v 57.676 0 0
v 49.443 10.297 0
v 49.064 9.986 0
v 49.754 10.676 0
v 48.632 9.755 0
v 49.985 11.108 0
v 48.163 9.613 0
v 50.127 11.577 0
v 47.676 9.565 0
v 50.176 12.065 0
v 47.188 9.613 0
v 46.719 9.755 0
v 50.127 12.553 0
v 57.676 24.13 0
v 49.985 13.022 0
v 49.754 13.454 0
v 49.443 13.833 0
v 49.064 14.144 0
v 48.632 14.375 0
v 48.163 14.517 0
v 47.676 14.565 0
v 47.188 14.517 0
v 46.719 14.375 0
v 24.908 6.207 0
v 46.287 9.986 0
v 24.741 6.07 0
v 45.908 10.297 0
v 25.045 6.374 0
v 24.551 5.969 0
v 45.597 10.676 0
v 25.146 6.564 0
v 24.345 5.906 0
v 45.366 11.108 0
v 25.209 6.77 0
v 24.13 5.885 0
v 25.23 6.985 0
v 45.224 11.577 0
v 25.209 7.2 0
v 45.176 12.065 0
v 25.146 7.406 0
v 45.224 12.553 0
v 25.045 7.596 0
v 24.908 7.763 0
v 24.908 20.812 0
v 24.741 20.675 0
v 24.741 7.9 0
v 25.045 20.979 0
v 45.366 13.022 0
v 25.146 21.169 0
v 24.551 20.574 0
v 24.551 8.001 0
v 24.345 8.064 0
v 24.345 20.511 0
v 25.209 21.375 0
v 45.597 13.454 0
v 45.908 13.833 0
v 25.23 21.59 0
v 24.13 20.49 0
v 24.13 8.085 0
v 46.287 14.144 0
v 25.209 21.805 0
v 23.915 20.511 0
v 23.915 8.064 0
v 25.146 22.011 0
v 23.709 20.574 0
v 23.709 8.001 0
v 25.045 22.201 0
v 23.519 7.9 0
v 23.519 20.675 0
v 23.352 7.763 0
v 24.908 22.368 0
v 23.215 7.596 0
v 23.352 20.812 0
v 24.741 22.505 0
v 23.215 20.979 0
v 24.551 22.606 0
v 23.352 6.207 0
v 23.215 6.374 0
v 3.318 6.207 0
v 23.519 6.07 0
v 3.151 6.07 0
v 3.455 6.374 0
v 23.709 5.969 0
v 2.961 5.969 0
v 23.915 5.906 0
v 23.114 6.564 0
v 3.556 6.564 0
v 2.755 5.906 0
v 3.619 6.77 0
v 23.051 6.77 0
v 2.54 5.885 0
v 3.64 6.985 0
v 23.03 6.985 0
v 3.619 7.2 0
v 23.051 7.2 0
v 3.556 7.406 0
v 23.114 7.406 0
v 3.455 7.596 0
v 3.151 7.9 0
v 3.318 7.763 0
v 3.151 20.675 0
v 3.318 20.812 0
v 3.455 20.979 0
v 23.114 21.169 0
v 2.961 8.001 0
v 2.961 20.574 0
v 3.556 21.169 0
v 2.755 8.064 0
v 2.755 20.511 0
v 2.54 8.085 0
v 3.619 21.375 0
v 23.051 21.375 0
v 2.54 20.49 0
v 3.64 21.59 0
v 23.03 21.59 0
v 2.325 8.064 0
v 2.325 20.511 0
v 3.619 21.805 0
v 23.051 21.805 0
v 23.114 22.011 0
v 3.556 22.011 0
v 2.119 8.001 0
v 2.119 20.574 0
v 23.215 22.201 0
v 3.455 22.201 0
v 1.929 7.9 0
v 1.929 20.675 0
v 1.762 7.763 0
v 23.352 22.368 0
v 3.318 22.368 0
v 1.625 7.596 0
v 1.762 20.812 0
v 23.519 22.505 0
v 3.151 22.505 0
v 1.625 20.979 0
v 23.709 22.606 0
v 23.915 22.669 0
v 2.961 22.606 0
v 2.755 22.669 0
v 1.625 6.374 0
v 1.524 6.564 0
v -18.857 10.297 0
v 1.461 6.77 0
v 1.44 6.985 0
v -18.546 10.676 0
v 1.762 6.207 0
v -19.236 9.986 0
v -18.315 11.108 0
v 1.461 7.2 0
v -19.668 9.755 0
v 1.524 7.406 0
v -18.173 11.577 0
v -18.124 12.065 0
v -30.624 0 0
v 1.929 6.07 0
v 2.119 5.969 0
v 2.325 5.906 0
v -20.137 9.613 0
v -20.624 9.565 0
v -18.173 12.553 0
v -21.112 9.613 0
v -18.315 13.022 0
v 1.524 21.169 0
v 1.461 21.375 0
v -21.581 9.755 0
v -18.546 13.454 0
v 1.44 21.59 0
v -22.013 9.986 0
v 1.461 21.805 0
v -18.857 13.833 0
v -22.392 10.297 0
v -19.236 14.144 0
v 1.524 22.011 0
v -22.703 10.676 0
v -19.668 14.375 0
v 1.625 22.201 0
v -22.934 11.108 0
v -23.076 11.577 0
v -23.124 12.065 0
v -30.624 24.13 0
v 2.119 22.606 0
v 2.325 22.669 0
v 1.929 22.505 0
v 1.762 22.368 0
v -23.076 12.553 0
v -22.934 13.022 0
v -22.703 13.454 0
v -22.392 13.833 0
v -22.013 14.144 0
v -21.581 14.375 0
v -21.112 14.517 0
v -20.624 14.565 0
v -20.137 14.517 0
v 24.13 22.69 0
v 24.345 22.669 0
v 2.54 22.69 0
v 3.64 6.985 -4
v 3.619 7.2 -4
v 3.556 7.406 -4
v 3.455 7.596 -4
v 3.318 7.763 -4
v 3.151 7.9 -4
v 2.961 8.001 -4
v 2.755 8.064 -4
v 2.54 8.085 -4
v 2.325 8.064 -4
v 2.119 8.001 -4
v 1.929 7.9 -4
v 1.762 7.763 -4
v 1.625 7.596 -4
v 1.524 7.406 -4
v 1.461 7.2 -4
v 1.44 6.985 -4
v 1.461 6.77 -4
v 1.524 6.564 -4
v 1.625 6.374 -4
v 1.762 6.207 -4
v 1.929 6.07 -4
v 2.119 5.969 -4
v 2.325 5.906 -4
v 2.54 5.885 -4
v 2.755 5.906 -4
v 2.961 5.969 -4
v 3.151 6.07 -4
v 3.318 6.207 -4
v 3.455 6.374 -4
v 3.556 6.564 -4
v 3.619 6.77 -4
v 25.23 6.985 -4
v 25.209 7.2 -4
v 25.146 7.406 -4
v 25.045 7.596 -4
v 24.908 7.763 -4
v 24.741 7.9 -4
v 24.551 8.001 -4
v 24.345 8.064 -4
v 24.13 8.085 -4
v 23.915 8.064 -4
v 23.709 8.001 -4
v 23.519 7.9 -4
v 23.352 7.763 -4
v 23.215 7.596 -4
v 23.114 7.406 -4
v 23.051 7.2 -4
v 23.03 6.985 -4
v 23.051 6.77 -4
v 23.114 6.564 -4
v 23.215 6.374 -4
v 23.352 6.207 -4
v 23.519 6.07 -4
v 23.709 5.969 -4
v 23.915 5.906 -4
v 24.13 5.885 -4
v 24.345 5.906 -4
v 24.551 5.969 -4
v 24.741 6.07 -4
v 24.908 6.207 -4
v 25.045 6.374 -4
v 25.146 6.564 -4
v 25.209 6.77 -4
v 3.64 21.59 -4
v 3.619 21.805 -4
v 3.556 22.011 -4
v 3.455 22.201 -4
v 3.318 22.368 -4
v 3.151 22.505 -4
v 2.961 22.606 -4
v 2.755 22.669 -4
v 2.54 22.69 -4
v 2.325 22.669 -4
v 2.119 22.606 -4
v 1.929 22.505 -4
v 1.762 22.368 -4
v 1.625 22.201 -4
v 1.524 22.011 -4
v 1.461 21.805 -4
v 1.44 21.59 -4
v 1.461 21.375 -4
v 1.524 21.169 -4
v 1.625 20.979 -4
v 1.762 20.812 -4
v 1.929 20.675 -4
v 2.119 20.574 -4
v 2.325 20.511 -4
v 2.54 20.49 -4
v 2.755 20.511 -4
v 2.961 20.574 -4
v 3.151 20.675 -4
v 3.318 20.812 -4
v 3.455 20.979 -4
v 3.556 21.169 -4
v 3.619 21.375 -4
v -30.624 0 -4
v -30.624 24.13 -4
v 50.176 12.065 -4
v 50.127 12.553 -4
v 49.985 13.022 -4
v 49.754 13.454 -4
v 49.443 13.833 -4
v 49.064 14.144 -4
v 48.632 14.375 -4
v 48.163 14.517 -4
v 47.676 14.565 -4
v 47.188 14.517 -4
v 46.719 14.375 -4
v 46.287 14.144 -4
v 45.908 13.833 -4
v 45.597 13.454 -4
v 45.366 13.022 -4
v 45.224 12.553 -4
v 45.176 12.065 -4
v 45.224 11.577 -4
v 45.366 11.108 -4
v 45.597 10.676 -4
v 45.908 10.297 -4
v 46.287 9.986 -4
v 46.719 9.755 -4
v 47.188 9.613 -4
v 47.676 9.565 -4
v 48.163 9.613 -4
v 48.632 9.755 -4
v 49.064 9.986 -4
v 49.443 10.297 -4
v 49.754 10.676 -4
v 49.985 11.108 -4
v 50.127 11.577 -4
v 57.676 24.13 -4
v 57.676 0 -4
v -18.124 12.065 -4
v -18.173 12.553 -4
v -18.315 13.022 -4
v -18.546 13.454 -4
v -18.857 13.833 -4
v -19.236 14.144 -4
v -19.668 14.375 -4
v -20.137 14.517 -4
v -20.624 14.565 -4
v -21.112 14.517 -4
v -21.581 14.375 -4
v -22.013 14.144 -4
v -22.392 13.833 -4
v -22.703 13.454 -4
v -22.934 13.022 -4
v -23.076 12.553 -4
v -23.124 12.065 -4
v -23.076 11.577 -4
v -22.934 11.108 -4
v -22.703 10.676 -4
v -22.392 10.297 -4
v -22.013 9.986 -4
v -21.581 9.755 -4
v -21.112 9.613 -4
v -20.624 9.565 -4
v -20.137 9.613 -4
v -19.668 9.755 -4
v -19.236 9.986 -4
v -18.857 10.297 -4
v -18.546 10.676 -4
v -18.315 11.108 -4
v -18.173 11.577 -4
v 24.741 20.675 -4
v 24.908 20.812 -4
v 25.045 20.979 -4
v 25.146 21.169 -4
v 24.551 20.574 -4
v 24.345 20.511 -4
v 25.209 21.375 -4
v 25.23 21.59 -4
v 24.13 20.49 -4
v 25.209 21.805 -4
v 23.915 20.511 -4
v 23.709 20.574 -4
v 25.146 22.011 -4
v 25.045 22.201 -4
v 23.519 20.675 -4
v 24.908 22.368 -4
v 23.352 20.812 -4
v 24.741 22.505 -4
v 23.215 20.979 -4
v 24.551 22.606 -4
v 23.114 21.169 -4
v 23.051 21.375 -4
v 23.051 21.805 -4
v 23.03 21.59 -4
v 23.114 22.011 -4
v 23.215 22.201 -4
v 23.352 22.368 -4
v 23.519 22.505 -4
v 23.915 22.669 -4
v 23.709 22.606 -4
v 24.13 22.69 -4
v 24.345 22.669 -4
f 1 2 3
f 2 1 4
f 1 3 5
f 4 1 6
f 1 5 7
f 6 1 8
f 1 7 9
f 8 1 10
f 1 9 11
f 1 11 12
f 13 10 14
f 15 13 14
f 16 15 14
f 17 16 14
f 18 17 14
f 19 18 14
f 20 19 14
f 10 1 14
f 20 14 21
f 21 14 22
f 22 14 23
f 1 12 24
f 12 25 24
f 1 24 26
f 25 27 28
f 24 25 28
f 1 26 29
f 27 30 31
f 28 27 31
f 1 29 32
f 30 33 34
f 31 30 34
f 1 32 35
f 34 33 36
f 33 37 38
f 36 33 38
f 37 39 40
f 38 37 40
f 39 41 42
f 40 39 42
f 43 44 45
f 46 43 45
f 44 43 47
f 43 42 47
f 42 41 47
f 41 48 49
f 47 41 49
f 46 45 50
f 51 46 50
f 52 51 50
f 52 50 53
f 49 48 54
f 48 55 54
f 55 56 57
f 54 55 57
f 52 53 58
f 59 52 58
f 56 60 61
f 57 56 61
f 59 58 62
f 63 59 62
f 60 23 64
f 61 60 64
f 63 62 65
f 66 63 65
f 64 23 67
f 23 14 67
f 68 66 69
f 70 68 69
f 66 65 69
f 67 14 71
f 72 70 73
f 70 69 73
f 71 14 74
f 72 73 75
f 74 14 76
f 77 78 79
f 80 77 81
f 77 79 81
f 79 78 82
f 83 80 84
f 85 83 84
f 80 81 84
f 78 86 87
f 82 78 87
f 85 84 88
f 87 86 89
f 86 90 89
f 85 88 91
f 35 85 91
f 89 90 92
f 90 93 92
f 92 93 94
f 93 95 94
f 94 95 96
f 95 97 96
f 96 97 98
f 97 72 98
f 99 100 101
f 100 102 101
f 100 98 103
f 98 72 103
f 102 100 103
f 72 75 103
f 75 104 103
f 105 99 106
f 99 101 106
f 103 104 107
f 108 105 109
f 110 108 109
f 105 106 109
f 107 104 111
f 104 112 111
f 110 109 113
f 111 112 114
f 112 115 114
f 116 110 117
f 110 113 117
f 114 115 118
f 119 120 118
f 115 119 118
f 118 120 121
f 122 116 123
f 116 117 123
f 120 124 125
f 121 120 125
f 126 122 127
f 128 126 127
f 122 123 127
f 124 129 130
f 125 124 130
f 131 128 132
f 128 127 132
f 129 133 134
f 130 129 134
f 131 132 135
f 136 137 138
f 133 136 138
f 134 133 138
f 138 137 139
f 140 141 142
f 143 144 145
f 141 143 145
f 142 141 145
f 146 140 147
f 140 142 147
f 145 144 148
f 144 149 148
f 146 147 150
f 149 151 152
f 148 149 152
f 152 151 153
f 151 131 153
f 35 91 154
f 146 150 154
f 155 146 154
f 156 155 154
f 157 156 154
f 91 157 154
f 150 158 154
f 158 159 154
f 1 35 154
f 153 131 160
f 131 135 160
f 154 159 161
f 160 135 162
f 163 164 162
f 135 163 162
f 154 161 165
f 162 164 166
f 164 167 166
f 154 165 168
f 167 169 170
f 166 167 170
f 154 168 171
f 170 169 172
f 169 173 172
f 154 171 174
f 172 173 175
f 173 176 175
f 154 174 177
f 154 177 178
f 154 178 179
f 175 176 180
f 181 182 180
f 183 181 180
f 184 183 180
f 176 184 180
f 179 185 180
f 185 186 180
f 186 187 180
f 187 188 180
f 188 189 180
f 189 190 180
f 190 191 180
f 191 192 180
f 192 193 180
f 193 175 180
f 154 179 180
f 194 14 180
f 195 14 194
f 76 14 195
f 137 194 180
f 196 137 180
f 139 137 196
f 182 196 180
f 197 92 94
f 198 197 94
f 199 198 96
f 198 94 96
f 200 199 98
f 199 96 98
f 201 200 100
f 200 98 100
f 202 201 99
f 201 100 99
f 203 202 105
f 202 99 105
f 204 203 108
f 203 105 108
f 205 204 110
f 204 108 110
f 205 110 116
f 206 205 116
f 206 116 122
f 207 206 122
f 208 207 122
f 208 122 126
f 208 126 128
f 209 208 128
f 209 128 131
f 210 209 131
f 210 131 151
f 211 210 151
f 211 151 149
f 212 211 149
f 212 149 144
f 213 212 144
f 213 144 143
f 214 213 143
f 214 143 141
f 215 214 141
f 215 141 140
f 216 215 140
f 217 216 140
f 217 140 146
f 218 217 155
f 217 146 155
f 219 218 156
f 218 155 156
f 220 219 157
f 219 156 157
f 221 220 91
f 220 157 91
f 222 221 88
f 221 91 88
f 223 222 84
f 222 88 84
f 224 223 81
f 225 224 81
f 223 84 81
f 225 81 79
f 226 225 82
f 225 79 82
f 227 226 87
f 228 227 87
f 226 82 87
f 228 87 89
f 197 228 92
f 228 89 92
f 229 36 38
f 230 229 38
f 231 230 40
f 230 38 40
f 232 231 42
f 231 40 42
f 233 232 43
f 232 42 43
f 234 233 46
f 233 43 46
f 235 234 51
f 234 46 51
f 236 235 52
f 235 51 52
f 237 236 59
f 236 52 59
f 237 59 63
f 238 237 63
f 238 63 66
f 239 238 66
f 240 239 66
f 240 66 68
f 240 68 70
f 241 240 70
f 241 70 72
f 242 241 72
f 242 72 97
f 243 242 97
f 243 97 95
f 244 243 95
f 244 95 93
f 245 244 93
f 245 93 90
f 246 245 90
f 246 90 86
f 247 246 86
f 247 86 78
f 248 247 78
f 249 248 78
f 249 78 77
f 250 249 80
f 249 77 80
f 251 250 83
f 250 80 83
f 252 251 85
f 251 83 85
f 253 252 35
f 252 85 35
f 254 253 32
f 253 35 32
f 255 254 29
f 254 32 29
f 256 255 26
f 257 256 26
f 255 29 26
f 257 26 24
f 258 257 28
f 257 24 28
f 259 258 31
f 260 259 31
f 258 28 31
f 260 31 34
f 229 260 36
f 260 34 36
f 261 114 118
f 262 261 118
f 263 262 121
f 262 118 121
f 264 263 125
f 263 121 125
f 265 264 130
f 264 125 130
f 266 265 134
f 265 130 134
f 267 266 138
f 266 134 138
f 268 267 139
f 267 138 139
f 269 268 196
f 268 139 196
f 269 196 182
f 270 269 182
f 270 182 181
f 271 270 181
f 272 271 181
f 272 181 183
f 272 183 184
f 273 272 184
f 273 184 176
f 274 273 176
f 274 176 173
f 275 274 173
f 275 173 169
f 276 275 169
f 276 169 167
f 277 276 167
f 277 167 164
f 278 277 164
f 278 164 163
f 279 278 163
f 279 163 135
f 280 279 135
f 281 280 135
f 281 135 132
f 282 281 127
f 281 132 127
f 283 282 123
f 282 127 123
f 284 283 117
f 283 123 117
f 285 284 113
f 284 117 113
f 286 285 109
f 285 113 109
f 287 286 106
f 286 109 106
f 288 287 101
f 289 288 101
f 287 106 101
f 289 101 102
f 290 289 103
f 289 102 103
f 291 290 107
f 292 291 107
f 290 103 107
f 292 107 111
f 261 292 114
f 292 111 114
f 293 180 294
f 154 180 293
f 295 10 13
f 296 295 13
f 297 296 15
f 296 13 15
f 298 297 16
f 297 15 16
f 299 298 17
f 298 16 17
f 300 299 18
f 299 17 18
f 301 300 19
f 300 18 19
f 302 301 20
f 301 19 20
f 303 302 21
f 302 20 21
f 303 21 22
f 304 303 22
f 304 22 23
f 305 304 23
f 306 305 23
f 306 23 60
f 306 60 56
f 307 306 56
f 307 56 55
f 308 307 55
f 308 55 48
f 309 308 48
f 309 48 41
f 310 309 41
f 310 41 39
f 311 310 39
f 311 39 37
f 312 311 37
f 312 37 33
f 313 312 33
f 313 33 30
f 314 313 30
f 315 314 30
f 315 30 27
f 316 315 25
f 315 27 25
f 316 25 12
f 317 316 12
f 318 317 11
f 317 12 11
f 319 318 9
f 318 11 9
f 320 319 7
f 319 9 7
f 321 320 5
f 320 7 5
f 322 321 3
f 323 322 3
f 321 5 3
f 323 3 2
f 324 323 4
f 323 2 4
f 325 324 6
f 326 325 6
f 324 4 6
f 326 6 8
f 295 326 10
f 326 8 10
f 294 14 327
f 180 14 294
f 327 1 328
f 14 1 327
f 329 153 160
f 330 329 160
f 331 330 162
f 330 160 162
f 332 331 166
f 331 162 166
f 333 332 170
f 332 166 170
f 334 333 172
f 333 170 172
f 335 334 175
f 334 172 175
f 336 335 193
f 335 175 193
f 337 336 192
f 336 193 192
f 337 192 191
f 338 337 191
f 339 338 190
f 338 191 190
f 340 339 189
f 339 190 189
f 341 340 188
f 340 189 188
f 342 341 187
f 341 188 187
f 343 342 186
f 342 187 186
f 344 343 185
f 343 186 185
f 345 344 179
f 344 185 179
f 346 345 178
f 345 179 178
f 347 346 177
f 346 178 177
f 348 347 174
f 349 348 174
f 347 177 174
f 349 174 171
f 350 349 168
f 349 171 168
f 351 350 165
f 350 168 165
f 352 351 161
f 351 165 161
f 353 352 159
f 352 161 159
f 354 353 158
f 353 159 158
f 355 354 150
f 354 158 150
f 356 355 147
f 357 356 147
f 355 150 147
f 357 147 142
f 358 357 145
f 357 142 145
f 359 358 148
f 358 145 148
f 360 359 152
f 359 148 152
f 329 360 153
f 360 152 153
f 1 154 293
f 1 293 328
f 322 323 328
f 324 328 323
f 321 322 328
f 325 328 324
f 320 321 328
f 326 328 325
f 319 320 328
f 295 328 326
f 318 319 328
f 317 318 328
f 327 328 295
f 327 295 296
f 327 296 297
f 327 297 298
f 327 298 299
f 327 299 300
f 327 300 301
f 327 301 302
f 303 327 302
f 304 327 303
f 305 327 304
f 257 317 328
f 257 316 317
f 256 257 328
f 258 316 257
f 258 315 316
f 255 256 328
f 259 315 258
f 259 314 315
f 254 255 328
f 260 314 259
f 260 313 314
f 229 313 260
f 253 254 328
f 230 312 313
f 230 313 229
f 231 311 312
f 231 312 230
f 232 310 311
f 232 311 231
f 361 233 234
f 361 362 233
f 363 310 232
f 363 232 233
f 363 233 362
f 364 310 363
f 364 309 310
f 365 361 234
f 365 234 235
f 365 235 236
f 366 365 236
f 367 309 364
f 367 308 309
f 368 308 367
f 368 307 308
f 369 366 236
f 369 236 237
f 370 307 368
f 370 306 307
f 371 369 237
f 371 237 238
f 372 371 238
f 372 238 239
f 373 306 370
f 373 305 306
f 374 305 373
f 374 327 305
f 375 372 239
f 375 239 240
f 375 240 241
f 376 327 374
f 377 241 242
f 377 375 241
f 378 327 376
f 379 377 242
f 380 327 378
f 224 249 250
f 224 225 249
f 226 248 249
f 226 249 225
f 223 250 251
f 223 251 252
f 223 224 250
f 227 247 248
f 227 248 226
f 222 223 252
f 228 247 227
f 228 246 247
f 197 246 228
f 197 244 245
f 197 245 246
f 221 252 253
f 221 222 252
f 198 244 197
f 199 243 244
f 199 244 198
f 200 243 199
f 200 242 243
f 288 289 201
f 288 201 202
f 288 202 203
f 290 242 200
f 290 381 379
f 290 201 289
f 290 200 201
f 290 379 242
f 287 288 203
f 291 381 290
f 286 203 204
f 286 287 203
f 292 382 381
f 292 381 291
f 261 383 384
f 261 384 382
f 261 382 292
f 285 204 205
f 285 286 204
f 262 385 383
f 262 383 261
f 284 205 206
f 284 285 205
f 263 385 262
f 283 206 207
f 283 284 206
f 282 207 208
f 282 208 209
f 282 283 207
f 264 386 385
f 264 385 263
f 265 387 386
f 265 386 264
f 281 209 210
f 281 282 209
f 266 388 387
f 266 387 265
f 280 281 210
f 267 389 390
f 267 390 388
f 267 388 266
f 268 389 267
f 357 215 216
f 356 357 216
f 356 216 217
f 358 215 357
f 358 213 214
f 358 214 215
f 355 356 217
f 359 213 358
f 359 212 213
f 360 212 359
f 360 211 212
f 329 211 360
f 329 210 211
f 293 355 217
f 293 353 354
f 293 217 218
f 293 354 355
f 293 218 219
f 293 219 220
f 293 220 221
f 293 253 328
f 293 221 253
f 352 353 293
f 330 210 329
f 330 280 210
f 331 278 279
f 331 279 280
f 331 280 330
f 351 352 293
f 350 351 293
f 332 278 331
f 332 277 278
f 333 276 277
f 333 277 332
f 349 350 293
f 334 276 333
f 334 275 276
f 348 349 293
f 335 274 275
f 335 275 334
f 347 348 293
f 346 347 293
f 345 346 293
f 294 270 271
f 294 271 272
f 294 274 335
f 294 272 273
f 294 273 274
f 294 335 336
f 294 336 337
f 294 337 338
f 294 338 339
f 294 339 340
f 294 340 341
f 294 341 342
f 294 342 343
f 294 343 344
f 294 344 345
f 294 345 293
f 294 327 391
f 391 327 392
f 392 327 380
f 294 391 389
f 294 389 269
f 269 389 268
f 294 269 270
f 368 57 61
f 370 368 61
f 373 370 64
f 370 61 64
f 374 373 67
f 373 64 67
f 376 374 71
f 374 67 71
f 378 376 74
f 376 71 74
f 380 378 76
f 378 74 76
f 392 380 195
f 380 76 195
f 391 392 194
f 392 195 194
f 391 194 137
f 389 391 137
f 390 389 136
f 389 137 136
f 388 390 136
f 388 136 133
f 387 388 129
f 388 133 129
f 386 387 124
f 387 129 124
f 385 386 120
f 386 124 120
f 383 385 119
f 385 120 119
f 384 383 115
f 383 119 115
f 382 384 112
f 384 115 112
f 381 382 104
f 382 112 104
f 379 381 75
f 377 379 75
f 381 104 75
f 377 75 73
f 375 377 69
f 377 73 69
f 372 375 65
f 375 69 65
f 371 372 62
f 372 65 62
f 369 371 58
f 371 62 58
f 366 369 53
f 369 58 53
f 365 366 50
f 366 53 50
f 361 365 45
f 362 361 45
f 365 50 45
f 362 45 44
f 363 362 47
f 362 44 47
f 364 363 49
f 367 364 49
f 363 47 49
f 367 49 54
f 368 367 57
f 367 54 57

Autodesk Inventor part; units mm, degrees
ref_plane "YZ Plane" through (0, 0, 0) normal (1, 0, 0) x (0, 1, 0)
ref_plane "Work Plane1" through (24.13, 24.13, 0) normal (0, 0, -1) x (-1, 0, 0)
sketch "Sketch1" plane through (24.13, 24.13, 0) normal (0, 0, -1) x (-1, 0, 0)
  line L0 (0, 0) -> (21.59, 0) projected
  line L1 (-2.54, -21.59) -> (-2.54, -2.54) projected
  line L2 (-2.54, -2.54) -> (-2.54, 0)
  line L3 (-2.54, 0) -> (0, 0)
  line L4 (24.13, -24.13) -> (-2.54, -24.13)
  line L5 (-2.54, -24.13) -> (-2.54, 0)
  line L6 (-2.54, 0) -> (24.13, 0)
  line L7 (24.13, 0) -> (24.13, -24.13)
  line L8 (10.795, -24.13) -> (10.414, 0)
  line L9 (24.13, -12.065) -> (10.6045, -12.065)
  line L10 (-33.5455, 0) -> (54.7545, 0)
  line L11 (54.7545, 0) -> (54.7545, -24.13)
  line L12 (54.7545, -24.13) -> (-33.5455, -24.13)
  line L13 (-33.5455, -24.13) -> (-33.5455, 0)
  line L14 (-33.5455, 0) -> (54.7545, -24.13) construction
  line L15 (54.7545, 0) -> (-33.5455, -24.13) construction
  dimension "d1" = 88.3
extrude "Extrusion1" add sketch "Sketch1" along normal blind 4
sketch "Sketch2" plane through (24.13, 24.13, 0) normal (0, 0, 1) x (1, 0, 0)
  circle A0 centre (-21.59, -17.145) radius 1.1 projected
  circle A1 centre (-21.59, -17.145) radius 1.1
  circle A2 centre (0, -17.145) radius 1.1 projected
  circle A3 centre (0, -17.145) radius 1.1
  circle A4 centre (0, -2.54) radius 1.1 projected
  circle A5 centre (0, -2.54) radius 1.1
  circle A6 centre (-21.59, -2.54) radius 1.1 projected
  circle A7 centre (-21.59, -2.54) radius 1.1
  point P0 (-24.13, -24.13)
extrude "Extrusion2" cut sketch "Sketch2" against normal blind 4
ref_plane "Work Plane2" through (24.13, 24.13, 0) normal (0, 0, 1) x (1, 0, 0)
sketch "Sketch3" plane through (24.13, 24.13, 0) normal (0, 0, 1) x (1, 0, 0)
  line L0 (-54.7545, -24.13) -> (-54.7545, 0) projected
  line L1 (-54.7545, -12.065) -> (-44.7545, -12.065)
  line L2 (33.5455, 0) -> (33.5455, -24.13) projected
  line L3 (33.5455, -12.065) -> (23.5455, -12.065)
  circle A0 centre (-44.7545, -12.065) radius 2.5
  circle A1 centre (23.5455, -12.065) radius 2.5
  point P0 (-24.13, -24.13)
  dimension "d6" = 10
  dimension "d7" = 10
  dimension "d8" = 5
  dimension "d9" = 5
extrude "Extrusion3" cut sketch "Sketch3" against normal blind 4
properties part number "A4988_driver_holder"
